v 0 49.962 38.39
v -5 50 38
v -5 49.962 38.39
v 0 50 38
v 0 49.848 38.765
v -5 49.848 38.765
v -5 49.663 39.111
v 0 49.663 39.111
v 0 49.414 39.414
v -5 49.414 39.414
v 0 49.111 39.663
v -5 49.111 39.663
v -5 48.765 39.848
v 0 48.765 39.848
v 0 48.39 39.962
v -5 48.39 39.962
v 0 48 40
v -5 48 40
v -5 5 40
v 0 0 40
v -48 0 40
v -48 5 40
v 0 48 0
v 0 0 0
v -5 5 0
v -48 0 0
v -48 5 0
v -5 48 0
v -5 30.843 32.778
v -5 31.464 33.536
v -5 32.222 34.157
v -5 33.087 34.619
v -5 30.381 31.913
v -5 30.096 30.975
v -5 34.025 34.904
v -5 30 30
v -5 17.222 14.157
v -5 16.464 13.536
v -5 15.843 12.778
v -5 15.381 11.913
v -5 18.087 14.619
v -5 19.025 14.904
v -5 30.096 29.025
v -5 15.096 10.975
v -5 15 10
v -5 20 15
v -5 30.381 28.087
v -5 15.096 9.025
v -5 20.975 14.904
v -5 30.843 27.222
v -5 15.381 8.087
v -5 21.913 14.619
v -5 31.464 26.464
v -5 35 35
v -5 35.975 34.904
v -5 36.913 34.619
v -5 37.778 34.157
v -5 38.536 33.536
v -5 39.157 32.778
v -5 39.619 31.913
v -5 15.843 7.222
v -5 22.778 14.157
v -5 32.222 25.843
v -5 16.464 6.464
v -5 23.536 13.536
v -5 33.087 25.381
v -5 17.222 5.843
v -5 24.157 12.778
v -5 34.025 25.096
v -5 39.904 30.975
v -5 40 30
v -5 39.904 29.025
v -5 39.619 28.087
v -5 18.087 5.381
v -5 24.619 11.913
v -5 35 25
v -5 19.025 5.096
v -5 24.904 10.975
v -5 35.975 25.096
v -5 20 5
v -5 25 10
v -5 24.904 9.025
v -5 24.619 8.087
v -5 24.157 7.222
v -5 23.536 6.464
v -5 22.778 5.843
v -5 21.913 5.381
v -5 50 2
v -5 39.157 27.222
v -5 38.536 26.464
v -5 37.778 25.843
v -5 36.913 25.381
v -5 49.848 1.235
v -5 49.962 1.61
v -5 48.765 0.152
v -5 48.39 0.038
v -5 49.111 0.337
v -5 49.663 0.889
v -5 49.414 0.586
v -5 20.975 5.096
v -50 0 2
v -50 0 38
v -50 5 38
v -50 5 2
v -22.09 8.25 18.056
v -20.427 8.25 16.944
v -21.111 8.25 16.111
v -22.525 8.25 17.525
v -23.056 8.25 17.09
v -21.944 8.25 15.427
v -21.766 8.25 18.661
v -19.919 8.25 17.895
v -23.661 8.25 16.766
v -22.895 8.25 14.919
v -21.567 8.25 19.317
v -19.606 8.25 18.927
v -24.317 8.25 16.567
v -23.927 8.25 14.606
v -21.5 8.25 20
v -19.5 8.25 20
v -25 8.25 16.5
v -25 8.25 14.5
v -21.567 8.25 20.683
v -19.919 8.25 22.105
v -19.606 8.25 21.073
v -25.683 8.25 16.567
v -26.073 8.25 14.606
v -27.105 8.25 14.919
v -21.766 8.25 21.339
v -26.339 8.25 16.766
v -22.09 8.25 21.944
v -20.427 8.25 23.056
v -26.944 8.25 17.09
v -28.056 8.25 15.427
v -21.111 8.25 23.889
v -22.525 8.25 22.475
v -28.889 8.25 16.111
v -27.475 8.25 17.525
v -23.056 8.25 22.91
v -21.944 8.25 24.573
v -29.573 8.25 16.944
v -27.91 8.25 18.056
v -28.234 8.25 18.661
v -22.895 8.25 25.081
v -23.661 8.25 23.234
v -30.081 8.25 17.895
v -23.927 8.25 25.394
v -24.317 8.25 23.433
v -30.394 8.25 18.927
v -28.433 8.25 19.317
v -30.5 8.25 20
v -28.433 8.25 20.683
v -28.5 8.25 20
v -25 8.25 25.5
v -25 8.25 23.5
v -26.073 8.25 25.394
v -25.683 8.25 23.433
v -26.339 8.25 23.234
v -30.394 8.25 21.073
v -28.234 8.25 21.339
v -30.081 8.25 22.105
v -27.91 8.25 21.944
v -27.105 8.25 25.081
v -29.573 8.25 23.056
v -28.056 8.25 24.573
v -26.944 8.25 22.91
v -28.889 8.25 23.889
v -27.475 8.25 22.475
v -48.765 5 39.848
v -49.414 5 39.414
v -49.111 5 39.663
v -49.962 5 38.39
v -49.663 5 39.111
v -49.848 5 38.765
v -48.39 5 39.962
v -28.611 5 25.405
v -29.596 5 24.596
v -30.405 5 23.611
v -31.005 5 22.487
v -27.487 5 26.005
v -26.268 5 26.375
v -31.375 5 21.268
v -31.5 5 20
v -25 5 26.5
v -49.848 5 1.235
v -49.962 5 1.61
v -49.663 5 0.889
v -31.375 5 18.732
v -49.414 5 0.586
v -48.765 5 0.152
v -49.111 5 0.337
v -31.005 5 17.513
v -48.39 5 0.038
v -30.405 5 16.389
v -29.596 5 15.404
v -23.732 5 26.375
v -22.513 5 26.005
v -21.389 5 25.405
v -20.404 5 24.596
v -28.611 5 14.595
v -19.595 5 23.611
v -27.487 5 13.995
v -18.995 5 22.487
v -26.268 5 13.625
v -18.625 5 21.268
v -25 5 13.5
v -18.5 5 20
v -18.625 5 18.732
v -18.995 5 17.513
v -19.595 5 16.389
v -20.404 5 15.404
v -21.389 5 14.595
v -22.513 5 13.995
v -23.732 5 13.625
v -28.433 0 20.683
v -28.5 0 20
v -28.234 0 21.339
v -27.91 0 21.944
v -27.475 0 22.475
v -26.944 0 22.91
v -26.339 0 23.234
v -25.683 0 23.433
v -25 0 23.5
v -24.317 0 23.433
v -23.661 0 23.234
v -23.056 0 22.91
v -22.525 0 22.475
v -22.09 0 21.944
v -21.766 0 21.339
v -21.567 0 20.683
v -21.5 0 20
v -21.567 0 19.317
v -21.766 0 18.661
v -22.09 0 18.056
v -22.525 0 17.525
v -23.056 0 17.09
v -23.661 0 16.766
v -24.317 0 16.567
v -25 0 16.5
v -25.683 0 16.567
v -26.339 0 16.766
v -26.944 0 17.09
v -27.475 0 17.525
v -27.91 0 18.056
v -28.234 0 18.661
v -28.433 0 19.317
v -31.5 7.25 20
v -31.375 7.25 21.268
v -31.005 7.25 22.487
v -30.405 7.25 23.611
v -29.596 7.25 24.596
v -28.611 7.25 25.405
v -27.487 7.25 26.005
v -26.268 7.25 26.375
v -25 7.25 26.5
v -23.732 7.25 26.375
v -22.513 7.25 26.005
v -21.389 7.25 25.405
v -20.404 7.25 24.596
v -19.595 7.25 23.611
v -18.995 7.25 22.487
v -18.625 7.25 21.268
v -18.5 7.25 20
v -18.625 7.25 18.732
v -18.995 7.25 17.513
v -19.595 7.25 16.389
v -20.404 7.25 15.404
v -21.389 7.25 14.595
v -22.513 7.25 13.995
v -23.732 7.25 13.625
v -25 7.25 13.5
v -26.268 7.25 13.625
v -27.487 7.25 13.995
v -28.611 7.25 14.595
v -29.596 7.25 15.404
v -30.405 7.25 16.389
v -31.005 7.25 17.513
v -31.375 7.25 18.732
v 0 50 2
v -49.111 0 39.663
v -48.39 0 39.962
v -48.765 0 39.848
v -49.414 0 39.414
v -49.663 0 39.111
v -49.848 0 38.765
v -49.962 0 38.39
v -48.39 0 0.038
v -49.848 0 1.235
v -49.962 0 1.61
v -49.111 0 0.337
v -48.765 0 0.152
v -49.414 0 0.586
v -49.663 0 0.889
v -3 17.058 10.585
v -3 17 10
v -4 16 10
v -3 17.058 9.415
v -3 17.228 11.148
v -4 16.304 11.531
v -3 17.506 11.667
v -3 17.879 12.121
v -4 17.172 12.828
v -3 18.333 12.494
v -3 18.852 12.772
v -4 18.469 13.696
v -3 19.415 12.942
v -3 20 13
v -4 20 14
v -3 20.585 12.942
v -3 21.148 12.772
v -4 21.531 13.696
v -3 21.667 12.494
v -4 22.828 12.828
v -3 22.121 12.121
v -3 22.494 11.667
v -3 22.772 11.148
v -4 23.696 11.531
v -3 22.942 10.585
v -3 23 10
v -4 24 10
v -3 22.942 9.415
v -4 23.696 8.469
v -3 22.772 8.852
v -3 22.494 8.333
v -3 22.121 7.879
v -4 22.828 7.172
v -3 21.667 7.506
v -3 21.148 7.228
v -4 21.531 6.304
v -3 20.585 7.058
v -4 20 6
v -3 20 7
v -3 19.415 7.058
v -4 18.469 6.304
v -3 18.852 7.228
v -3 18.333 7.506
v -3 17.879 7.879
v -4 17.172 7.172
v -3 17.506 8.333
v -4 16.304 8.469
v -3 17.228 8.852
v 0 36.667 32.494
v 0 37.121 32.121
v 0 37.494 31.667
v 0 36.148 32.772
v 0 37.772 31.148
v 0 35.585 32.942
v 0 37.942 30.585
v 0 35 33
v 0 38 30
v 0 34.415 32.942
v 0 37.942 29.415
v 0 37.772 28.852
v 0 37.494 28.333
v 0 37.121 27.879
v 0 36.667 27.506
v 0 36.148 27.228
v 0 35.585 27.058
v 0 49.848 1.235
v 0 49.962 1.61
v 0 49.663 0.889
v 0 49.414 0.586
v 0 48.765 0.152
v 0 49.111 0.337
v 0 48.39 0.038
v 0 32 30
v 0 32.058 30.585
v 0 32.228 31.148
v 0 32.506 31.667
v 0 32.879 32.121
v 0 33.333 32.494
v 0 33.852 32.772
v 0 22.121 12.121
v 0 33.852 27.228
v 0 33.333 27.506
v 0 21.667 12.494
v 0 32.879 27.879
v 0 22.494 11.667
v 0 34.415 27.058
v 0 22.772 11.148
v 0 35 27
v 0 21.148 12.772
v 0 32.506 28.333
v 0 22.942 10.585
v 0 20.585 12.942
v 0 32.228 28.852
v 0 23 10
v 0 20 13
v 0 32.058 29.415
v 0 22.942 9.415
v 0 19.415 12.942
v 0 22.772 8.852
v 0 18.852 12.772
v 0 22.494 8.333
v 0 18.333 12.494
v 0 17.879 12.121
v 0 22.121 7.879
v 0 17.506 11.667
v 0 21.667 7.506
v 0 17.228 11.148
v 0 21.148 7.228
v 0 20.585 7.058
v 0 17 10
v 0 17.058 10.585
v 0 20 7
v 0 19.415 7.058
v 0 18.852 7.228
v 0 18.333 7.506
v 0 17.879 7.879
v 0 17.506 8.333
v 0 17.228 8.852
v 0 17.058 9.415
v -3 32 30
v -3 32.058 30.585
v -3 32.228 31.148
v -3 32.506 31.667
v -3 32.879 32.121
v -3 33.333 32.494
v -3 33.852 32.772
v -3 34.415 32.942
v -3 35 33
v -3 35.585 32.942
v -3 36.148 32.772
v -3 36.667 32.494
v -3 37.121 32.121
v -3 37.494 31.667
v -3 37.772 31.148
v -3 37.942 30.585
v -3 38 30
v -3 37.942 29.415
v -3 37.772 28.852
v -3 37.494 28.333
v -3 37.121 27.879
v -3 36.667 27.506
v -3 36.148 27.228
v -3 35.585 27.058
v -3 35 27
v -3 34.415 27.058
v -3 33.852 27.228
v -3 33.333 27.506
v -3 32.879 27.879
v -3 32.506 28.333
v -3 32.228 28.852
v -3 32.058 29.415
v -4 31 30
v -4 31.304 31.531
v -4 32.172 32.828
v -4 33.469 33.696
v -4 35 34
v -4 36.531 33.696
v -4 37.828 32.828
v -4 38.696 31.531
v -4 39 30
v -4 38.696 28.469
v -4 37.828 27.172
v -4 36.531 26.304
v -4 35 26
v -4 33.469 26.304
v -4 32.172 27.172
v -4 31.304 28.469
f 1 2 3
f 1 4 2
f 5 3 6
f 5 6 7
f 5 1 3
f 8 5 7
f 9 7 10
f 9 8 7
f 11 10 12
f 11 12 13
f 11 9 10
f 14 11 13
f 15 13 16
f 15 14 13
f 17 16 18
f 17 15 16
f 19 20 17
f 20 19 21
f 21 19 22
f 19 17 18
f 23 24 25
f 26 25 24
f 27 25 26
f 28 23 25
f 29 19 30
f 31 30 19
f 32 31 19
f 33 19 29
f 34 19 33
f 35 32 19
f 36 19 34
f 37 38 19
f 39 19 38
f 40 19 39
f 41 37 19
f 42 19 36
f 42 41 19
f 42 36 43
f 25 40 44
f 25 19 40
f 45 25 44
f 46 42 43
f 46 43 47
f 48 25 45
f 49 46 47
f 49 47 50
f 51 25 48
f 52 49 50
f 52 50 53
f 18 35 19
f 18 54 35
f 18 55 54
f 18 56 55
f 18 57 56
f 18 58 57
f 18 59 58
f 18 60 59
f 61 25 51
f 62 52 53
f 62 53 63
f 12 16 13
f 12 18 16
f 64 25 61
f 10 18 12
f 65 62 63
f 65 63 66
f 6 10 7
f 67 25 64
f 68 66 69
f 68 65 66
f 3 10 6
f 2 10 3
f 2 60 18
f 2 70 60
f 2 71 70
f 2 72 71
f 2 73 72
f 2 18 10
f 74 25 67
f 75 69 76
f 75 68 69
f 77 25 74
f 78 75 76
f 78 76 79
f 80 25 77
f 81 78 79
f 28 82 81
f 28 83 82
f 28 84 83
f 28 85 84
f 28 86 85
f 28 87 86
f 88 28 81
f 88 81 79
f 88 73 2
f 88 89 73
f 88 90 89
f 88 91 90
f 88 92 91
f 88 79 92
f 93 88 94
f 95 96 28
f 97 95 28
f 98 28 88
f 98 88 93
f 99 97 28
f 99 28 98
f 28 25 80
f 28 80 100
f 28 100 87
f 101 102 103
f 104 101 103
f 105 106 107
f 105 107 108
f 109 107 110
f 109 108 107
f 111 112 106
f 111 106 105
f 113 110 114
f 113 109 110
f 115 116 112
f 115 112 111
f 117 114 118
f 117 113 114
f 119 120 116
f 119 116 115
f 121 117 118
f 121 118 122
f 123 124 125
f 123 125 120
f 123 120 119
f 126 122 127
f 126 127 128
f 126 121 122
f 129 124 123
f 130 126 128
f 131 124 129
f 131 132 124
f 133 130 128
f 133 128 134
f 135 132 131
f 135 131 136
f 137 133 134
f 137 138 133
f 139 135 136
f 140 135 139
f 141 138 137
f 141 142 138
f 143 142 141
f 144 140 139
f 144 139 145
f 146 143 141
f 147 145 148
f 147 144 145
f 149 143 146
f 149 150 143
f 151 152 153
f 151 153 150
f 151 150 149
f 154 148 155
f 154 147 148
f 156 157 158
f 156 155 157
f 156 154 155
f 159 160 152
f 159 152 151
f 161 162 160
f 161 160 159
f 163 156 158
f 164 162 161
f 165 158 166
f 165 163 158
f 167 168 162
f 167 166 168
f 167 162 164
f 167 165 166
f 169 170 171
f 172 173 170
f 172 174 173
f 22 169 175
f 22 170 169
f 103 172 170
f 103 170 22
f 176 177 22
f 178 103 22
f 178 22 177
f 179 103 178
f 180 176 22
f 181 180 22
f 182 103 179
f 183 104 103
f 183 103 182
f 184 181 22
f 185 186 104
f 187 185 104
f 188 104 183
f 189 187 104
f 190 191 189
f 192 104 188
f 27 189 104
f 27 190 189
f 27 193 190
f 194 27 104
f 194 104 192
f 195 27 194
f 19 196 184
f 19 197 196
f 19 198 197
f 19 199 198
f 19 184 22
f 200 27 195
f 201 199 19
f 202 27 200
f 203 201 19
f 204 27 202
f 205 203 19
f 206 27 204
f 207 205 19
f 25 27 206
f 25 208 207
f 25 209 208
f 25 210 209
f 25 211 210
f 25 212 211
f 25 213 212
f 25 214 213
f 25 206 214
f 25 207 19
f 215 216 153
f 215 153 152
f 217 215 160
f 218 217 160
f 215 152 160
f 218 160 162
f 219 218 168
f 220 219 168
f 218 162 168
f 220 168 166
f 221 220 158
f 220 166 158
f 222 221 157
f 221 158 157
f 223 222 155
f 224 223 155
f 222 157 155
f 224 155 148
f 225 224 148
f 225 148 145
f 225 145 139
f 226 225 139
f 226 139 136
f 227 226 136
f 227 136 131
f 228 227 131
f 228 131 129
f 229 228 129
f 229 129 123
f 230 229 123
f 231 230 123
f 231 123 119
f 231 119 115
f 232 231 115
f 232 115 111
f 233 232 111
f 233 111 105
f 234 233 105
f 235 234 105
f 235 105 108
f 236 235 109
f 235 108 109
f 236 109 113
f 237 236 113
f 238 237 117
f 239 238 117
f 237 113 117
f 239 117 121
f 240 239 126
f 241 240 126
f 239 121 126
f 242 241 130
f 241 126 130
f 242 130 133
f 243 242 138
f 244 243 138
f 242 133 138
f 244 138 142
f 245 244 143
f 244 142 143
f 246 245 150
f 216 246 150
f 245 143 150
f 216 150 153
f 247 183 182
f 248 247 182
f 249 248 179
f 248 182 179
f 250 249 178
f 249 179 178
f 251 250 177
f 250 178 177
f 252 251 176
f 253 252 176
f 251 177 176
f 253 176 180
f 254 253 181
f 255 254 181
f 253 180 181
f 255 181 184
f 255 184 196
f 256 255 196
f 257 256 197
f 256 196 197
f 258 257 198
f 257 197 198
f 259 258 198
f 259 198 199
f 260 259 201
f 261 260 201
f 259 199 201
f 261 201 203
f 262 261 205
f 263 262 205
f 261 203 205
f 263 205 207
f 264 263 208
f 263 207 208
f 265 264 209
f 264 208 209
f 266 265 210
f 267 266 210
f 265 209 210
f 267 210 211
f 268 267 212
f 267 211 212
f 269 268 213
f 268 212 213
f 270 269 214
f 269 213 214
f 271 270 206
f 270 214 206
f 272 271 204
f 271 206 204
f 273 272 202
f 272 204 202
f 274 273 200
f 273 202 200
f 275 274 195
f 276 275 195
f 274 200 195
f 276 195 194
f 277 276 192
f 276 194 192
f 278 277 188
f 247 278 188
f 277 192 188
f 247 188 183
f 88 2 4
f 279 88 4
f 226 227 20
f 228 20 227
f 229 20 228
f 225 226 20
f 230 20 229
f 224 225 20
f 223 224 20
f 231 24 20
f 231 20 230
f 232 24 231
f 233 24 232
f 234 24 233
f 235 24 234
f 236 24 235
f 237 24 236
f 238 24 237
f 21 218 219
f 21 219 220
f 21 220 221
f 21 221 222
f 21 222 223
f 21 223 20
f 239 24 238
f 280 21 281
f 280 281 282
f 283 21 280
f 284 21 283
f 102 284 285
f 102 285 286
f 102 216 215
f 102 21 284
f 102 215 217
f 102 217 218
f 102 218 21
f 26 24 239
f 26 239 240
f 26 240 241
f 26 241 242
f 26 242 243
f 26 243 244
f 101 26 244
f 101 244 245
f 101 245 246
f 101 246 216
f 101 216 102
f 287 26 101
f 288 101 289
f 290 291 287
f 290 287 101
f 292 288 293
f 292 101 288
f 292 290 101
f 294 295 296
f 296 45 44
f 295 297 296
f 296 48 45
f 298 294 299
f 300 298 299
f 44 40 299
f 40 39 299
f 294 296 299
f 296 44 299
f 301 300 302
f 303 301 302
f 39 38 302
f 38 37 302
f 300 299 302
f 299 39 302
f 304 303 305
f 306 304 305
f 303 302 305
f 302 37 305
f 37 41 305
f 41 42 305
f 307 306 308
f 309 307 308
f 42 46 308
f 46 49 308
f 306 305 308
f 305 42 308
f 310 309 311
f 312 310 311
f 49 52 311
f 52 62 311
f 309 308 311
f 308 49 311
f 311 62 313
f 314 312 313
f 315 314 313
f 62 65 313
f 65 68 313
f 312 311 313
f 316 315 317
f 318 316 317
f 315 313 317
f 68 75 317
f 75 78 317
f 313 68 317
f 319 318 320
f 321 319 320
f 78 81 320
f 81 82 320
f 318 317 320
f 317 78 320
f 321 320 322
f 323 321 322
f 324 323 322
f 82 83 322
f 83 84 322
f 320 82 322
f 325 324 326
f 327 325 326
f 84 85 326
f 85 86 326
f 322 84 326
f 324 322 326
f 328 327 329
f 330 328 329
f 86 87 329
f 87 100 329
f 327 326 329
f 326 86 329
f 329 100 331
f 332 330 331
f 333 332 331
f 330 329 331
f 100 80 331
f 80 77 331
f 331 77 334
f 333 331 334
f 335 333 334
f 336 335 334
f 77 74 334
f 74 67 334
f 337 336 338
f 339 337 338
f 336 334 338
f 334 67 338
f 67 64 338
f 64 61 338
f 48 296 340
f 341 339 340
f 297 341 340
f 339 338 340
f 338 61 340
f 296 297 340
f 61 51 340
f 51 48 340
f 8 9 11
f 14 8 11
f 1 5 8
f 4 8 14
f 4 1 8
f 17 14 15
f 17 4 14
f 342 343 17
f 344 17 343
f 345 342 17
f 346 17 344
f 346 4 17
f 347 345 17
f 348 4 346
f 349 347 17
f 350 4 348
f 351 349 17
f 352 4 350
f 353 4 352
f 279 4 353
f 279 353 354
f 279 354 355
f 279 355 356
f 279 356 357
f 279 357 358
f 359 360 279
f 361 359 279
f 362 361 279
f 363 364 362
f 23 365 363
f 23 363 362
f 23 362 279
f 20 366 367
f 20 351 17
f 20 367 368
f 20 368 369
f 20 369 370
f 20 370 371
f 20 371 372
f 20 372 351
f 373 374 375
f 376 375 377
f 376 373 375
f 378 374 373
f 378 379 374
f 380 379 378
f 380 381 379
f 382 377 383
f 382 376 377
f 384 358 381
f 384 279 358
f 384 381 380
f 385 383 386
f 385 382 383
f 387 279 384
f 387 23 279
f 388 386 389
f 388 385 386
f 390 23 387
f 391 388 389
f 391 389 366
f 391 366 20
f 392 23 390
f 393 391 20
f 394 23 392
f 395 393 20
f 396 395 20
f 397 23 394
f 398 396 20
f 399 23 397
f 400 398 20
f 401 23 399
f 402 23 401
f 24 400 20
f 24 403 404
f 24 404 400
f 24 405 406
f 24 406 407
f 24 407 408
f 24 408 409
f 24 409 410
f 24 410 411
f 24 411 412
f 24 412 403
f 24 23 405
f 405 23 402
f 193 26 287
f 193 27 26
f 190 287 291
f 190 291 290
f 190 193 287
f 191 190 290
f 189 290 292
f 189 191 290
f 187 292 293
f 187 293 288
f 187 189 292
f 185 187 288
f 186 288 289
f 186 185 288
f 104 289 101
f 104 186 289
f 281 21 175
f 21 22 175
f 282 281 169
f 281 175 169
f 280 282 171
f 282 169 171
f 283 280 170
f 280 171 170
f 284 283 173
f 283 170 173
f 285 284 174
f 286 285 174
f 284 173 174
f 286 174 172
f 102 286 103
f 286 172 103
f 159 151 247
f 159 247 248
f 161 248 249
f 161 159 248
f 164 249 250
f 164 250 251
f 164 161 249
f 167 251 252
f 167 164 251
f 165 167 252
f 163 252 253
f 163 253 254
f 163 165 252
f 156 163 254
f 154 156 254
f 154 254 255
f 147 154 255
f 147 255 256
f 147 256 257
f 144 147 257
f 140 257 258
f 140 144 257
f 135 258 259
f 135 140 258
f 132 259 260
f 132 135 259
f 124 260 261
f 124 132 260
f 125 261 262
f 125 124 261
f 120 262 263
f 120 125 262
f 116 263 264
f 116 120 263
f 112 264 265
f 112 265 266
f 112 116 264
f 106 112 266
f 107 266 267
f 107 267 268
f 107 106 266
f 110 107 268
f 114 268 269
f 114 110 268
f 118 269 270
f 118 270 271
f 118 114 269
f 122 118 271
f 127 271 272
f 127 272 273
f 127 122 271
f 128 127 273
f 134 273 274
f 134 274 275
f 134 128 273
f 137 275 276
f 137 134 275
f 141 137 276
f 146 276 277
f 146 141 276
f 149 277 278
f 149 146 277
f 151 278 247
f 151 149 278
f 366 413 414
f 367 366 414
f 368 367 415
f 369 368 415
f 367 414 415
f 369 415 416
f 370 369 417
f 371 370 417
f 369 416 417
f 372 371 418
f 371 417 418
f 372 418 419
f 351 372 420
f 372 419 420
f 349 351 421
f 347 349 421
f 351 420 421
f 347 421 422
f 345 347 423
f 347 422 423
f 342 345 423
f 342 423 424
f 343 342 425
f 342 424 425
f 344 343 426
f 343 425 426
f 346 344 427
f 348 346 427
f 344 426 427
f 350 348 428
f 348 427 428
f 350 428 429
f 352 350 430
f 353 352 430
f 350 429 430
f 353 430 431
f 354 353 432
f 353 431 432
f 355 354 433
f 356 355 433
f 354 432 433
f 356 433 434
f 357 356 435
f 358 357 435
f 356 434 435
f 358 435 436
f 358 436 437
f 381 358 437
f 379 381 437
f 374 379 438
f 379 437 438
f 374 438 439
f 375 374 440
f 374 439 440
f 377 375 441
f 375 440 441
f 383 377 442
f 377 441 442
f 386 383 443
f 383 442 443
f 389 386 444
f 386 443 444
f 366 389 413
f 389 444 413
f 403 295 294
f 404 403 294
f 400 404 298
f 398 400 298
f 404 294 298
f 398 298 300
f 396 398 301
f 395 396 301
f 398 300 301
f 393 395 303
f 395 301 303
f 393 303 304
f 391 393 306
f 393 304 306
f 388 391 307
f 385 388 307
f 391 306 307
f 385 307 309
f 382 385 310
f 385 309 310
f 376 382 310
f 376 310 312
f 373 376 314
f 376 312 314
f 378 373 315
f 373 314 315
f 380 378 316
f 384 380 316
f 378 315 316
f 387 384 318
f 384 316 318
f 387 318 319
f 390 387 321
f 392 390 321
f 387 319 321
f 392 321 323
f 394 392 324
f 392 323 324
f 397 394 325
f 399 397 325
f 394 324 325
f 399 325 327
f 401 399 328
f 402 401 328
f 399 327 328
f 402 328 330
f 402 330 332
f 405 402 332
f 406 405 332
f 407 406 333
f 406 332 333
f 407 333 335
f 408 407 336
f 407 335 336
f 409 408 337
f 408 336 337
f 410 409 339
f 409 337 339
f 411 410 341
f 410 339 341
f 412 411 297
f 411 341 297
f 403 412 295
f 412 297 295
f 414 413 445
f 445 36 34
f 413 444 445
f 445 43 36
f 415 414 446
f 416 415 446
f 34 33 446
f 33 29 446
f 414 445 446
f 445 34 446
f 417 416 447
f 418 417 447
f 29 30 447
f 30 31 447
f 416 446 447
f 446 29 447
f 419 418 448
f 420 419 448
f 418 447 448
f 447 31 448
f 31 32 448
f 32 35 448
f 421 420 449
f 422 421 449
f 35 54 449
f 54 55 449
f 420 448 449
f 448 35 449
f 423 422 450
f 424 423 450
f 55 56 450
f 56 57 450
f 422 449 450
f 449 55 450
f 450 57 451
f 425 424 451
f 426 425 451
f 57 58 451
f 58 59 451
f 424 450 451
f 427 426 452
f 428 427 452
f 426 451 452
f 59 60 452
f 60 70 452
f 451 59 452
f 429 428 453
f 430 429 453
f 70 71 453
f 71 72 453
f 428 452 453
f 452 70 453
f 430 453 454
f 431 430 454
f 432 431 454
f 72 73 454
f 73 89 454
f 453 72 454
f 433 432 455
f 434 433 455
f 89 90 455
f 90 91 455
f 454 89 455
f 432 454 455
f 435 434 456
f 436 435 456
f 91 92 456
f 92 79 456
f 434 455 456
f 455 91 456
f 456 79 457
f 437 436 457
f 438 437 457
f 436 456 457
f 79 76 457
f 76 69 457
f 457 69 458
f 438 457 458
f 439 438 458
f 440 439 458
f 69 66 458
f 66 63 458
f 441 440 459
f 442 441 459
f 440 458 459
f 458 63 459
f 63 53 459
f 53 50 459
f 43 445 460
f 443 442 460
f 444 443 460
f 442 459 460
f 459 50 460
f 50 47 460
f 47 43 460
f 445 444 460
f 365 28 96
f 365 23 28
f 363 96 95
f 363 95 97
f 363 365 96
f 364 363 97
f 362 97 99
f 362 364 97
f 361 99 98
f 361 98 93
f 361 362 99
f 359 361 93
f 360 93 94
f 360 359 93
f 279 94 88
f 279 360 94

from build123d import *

# Parameters (mm, degrees)
PAD_DEPTH       = 40
SKETCH002_R     = 6.5
PAD001_DEPTH    = 3.25
SKETCH003_R     = 3.5
POCKET_DEPTH    = 8.251
SKETCH004_R     = 3
POCKET001_DEPTH = 5
CHAMFER_SIZE    = 2
FILLET_R        = 2
FILLET001_R     = 2
CHAMFER001_SIZE = 1


with BuildPart() as part:
    # Sketch → Pad (new body)
    with BuildSketch(Plane.XY):
        Polygon((0, 50), (0, 0), (-50, 0), (-50, 5), (-5, 5), (-5, 50), align=None)
    extrude(amount=PAD_DEPTH)

    # Sketch002 (on Face4 of Pad) → Pad001 (join)
    with BuildSketch(Plane(origin=(0, 5, 0), x_dir=(-1, 0, 0), z_dir=(0, 1, 0))):
        with Locations((25, 20)):
            Circle(SKETCH002_R)
    extrude(amount=PAD001_DEPTH)

    # Sketch003 (on Face10 of Pad001) → Pocket (cut, through all)
    with BuildSketch(Plane(origin=(0, 8.25, 0), x_dir=(-1, 0, 0), z_dir=(0, 1, 0))):
        with Locations((25, 20)):
            Circle(SKETCH003_R)
    extrude(amount=-POCKET_DEPTH, mode=Mode.SUBTRACT)

    # Sketch004 (on Face6 of Pocket) → Pocket001 (cut)
    with BuildSketch(Plane(origin=(-5, 0, 0), x_dir=(0, -1, 0), z_dir=(-1, 0, 0))):
        with Locations((-35, 30)):
            Circle(SKETCH004_R)
        with Locations((-20, 10)):
            Circle(SKETCH004_R)
    extrude(amount=-POCKET001_DEPTH, mode=Mode.SUBTRACT)

    # Chamfer
    chamfer_edges = [part.edges().sort_by_distance(p)[0] for p in [
        (-5, 23, 10),
        (-5, 38, 30),
    ]]
    chamfer(chamfer_edges, length=CHAMFER_SIZE)

    # Fillet
    fillet_edges = [part.edges().sort_by_distance(p)[0] for p in [
        (-50, 2.5, 40),
        (-50, 2.5, 0),
    ]]
    fillet(fillet_edges, radius=FILLET_R)

    # Fillet001
    fillet001_edges = [part.edges().sort_by_distance(p)[0] for p in [
        (-2.5, 50, 40),
        (-2.5, 50, 0),
    ]]
    fillet(fillet001_edges, radius=FILLET001_R)

    # Chamfer001
    chamfer001_edges = [part.edges().sort_by_distance(p)[0] for p in [
        (-18.5, 8.25, 20),
    ]]
    chamfer(chamfer001_edges, length=CHAMFER001_SIZE)


solid = part.part
